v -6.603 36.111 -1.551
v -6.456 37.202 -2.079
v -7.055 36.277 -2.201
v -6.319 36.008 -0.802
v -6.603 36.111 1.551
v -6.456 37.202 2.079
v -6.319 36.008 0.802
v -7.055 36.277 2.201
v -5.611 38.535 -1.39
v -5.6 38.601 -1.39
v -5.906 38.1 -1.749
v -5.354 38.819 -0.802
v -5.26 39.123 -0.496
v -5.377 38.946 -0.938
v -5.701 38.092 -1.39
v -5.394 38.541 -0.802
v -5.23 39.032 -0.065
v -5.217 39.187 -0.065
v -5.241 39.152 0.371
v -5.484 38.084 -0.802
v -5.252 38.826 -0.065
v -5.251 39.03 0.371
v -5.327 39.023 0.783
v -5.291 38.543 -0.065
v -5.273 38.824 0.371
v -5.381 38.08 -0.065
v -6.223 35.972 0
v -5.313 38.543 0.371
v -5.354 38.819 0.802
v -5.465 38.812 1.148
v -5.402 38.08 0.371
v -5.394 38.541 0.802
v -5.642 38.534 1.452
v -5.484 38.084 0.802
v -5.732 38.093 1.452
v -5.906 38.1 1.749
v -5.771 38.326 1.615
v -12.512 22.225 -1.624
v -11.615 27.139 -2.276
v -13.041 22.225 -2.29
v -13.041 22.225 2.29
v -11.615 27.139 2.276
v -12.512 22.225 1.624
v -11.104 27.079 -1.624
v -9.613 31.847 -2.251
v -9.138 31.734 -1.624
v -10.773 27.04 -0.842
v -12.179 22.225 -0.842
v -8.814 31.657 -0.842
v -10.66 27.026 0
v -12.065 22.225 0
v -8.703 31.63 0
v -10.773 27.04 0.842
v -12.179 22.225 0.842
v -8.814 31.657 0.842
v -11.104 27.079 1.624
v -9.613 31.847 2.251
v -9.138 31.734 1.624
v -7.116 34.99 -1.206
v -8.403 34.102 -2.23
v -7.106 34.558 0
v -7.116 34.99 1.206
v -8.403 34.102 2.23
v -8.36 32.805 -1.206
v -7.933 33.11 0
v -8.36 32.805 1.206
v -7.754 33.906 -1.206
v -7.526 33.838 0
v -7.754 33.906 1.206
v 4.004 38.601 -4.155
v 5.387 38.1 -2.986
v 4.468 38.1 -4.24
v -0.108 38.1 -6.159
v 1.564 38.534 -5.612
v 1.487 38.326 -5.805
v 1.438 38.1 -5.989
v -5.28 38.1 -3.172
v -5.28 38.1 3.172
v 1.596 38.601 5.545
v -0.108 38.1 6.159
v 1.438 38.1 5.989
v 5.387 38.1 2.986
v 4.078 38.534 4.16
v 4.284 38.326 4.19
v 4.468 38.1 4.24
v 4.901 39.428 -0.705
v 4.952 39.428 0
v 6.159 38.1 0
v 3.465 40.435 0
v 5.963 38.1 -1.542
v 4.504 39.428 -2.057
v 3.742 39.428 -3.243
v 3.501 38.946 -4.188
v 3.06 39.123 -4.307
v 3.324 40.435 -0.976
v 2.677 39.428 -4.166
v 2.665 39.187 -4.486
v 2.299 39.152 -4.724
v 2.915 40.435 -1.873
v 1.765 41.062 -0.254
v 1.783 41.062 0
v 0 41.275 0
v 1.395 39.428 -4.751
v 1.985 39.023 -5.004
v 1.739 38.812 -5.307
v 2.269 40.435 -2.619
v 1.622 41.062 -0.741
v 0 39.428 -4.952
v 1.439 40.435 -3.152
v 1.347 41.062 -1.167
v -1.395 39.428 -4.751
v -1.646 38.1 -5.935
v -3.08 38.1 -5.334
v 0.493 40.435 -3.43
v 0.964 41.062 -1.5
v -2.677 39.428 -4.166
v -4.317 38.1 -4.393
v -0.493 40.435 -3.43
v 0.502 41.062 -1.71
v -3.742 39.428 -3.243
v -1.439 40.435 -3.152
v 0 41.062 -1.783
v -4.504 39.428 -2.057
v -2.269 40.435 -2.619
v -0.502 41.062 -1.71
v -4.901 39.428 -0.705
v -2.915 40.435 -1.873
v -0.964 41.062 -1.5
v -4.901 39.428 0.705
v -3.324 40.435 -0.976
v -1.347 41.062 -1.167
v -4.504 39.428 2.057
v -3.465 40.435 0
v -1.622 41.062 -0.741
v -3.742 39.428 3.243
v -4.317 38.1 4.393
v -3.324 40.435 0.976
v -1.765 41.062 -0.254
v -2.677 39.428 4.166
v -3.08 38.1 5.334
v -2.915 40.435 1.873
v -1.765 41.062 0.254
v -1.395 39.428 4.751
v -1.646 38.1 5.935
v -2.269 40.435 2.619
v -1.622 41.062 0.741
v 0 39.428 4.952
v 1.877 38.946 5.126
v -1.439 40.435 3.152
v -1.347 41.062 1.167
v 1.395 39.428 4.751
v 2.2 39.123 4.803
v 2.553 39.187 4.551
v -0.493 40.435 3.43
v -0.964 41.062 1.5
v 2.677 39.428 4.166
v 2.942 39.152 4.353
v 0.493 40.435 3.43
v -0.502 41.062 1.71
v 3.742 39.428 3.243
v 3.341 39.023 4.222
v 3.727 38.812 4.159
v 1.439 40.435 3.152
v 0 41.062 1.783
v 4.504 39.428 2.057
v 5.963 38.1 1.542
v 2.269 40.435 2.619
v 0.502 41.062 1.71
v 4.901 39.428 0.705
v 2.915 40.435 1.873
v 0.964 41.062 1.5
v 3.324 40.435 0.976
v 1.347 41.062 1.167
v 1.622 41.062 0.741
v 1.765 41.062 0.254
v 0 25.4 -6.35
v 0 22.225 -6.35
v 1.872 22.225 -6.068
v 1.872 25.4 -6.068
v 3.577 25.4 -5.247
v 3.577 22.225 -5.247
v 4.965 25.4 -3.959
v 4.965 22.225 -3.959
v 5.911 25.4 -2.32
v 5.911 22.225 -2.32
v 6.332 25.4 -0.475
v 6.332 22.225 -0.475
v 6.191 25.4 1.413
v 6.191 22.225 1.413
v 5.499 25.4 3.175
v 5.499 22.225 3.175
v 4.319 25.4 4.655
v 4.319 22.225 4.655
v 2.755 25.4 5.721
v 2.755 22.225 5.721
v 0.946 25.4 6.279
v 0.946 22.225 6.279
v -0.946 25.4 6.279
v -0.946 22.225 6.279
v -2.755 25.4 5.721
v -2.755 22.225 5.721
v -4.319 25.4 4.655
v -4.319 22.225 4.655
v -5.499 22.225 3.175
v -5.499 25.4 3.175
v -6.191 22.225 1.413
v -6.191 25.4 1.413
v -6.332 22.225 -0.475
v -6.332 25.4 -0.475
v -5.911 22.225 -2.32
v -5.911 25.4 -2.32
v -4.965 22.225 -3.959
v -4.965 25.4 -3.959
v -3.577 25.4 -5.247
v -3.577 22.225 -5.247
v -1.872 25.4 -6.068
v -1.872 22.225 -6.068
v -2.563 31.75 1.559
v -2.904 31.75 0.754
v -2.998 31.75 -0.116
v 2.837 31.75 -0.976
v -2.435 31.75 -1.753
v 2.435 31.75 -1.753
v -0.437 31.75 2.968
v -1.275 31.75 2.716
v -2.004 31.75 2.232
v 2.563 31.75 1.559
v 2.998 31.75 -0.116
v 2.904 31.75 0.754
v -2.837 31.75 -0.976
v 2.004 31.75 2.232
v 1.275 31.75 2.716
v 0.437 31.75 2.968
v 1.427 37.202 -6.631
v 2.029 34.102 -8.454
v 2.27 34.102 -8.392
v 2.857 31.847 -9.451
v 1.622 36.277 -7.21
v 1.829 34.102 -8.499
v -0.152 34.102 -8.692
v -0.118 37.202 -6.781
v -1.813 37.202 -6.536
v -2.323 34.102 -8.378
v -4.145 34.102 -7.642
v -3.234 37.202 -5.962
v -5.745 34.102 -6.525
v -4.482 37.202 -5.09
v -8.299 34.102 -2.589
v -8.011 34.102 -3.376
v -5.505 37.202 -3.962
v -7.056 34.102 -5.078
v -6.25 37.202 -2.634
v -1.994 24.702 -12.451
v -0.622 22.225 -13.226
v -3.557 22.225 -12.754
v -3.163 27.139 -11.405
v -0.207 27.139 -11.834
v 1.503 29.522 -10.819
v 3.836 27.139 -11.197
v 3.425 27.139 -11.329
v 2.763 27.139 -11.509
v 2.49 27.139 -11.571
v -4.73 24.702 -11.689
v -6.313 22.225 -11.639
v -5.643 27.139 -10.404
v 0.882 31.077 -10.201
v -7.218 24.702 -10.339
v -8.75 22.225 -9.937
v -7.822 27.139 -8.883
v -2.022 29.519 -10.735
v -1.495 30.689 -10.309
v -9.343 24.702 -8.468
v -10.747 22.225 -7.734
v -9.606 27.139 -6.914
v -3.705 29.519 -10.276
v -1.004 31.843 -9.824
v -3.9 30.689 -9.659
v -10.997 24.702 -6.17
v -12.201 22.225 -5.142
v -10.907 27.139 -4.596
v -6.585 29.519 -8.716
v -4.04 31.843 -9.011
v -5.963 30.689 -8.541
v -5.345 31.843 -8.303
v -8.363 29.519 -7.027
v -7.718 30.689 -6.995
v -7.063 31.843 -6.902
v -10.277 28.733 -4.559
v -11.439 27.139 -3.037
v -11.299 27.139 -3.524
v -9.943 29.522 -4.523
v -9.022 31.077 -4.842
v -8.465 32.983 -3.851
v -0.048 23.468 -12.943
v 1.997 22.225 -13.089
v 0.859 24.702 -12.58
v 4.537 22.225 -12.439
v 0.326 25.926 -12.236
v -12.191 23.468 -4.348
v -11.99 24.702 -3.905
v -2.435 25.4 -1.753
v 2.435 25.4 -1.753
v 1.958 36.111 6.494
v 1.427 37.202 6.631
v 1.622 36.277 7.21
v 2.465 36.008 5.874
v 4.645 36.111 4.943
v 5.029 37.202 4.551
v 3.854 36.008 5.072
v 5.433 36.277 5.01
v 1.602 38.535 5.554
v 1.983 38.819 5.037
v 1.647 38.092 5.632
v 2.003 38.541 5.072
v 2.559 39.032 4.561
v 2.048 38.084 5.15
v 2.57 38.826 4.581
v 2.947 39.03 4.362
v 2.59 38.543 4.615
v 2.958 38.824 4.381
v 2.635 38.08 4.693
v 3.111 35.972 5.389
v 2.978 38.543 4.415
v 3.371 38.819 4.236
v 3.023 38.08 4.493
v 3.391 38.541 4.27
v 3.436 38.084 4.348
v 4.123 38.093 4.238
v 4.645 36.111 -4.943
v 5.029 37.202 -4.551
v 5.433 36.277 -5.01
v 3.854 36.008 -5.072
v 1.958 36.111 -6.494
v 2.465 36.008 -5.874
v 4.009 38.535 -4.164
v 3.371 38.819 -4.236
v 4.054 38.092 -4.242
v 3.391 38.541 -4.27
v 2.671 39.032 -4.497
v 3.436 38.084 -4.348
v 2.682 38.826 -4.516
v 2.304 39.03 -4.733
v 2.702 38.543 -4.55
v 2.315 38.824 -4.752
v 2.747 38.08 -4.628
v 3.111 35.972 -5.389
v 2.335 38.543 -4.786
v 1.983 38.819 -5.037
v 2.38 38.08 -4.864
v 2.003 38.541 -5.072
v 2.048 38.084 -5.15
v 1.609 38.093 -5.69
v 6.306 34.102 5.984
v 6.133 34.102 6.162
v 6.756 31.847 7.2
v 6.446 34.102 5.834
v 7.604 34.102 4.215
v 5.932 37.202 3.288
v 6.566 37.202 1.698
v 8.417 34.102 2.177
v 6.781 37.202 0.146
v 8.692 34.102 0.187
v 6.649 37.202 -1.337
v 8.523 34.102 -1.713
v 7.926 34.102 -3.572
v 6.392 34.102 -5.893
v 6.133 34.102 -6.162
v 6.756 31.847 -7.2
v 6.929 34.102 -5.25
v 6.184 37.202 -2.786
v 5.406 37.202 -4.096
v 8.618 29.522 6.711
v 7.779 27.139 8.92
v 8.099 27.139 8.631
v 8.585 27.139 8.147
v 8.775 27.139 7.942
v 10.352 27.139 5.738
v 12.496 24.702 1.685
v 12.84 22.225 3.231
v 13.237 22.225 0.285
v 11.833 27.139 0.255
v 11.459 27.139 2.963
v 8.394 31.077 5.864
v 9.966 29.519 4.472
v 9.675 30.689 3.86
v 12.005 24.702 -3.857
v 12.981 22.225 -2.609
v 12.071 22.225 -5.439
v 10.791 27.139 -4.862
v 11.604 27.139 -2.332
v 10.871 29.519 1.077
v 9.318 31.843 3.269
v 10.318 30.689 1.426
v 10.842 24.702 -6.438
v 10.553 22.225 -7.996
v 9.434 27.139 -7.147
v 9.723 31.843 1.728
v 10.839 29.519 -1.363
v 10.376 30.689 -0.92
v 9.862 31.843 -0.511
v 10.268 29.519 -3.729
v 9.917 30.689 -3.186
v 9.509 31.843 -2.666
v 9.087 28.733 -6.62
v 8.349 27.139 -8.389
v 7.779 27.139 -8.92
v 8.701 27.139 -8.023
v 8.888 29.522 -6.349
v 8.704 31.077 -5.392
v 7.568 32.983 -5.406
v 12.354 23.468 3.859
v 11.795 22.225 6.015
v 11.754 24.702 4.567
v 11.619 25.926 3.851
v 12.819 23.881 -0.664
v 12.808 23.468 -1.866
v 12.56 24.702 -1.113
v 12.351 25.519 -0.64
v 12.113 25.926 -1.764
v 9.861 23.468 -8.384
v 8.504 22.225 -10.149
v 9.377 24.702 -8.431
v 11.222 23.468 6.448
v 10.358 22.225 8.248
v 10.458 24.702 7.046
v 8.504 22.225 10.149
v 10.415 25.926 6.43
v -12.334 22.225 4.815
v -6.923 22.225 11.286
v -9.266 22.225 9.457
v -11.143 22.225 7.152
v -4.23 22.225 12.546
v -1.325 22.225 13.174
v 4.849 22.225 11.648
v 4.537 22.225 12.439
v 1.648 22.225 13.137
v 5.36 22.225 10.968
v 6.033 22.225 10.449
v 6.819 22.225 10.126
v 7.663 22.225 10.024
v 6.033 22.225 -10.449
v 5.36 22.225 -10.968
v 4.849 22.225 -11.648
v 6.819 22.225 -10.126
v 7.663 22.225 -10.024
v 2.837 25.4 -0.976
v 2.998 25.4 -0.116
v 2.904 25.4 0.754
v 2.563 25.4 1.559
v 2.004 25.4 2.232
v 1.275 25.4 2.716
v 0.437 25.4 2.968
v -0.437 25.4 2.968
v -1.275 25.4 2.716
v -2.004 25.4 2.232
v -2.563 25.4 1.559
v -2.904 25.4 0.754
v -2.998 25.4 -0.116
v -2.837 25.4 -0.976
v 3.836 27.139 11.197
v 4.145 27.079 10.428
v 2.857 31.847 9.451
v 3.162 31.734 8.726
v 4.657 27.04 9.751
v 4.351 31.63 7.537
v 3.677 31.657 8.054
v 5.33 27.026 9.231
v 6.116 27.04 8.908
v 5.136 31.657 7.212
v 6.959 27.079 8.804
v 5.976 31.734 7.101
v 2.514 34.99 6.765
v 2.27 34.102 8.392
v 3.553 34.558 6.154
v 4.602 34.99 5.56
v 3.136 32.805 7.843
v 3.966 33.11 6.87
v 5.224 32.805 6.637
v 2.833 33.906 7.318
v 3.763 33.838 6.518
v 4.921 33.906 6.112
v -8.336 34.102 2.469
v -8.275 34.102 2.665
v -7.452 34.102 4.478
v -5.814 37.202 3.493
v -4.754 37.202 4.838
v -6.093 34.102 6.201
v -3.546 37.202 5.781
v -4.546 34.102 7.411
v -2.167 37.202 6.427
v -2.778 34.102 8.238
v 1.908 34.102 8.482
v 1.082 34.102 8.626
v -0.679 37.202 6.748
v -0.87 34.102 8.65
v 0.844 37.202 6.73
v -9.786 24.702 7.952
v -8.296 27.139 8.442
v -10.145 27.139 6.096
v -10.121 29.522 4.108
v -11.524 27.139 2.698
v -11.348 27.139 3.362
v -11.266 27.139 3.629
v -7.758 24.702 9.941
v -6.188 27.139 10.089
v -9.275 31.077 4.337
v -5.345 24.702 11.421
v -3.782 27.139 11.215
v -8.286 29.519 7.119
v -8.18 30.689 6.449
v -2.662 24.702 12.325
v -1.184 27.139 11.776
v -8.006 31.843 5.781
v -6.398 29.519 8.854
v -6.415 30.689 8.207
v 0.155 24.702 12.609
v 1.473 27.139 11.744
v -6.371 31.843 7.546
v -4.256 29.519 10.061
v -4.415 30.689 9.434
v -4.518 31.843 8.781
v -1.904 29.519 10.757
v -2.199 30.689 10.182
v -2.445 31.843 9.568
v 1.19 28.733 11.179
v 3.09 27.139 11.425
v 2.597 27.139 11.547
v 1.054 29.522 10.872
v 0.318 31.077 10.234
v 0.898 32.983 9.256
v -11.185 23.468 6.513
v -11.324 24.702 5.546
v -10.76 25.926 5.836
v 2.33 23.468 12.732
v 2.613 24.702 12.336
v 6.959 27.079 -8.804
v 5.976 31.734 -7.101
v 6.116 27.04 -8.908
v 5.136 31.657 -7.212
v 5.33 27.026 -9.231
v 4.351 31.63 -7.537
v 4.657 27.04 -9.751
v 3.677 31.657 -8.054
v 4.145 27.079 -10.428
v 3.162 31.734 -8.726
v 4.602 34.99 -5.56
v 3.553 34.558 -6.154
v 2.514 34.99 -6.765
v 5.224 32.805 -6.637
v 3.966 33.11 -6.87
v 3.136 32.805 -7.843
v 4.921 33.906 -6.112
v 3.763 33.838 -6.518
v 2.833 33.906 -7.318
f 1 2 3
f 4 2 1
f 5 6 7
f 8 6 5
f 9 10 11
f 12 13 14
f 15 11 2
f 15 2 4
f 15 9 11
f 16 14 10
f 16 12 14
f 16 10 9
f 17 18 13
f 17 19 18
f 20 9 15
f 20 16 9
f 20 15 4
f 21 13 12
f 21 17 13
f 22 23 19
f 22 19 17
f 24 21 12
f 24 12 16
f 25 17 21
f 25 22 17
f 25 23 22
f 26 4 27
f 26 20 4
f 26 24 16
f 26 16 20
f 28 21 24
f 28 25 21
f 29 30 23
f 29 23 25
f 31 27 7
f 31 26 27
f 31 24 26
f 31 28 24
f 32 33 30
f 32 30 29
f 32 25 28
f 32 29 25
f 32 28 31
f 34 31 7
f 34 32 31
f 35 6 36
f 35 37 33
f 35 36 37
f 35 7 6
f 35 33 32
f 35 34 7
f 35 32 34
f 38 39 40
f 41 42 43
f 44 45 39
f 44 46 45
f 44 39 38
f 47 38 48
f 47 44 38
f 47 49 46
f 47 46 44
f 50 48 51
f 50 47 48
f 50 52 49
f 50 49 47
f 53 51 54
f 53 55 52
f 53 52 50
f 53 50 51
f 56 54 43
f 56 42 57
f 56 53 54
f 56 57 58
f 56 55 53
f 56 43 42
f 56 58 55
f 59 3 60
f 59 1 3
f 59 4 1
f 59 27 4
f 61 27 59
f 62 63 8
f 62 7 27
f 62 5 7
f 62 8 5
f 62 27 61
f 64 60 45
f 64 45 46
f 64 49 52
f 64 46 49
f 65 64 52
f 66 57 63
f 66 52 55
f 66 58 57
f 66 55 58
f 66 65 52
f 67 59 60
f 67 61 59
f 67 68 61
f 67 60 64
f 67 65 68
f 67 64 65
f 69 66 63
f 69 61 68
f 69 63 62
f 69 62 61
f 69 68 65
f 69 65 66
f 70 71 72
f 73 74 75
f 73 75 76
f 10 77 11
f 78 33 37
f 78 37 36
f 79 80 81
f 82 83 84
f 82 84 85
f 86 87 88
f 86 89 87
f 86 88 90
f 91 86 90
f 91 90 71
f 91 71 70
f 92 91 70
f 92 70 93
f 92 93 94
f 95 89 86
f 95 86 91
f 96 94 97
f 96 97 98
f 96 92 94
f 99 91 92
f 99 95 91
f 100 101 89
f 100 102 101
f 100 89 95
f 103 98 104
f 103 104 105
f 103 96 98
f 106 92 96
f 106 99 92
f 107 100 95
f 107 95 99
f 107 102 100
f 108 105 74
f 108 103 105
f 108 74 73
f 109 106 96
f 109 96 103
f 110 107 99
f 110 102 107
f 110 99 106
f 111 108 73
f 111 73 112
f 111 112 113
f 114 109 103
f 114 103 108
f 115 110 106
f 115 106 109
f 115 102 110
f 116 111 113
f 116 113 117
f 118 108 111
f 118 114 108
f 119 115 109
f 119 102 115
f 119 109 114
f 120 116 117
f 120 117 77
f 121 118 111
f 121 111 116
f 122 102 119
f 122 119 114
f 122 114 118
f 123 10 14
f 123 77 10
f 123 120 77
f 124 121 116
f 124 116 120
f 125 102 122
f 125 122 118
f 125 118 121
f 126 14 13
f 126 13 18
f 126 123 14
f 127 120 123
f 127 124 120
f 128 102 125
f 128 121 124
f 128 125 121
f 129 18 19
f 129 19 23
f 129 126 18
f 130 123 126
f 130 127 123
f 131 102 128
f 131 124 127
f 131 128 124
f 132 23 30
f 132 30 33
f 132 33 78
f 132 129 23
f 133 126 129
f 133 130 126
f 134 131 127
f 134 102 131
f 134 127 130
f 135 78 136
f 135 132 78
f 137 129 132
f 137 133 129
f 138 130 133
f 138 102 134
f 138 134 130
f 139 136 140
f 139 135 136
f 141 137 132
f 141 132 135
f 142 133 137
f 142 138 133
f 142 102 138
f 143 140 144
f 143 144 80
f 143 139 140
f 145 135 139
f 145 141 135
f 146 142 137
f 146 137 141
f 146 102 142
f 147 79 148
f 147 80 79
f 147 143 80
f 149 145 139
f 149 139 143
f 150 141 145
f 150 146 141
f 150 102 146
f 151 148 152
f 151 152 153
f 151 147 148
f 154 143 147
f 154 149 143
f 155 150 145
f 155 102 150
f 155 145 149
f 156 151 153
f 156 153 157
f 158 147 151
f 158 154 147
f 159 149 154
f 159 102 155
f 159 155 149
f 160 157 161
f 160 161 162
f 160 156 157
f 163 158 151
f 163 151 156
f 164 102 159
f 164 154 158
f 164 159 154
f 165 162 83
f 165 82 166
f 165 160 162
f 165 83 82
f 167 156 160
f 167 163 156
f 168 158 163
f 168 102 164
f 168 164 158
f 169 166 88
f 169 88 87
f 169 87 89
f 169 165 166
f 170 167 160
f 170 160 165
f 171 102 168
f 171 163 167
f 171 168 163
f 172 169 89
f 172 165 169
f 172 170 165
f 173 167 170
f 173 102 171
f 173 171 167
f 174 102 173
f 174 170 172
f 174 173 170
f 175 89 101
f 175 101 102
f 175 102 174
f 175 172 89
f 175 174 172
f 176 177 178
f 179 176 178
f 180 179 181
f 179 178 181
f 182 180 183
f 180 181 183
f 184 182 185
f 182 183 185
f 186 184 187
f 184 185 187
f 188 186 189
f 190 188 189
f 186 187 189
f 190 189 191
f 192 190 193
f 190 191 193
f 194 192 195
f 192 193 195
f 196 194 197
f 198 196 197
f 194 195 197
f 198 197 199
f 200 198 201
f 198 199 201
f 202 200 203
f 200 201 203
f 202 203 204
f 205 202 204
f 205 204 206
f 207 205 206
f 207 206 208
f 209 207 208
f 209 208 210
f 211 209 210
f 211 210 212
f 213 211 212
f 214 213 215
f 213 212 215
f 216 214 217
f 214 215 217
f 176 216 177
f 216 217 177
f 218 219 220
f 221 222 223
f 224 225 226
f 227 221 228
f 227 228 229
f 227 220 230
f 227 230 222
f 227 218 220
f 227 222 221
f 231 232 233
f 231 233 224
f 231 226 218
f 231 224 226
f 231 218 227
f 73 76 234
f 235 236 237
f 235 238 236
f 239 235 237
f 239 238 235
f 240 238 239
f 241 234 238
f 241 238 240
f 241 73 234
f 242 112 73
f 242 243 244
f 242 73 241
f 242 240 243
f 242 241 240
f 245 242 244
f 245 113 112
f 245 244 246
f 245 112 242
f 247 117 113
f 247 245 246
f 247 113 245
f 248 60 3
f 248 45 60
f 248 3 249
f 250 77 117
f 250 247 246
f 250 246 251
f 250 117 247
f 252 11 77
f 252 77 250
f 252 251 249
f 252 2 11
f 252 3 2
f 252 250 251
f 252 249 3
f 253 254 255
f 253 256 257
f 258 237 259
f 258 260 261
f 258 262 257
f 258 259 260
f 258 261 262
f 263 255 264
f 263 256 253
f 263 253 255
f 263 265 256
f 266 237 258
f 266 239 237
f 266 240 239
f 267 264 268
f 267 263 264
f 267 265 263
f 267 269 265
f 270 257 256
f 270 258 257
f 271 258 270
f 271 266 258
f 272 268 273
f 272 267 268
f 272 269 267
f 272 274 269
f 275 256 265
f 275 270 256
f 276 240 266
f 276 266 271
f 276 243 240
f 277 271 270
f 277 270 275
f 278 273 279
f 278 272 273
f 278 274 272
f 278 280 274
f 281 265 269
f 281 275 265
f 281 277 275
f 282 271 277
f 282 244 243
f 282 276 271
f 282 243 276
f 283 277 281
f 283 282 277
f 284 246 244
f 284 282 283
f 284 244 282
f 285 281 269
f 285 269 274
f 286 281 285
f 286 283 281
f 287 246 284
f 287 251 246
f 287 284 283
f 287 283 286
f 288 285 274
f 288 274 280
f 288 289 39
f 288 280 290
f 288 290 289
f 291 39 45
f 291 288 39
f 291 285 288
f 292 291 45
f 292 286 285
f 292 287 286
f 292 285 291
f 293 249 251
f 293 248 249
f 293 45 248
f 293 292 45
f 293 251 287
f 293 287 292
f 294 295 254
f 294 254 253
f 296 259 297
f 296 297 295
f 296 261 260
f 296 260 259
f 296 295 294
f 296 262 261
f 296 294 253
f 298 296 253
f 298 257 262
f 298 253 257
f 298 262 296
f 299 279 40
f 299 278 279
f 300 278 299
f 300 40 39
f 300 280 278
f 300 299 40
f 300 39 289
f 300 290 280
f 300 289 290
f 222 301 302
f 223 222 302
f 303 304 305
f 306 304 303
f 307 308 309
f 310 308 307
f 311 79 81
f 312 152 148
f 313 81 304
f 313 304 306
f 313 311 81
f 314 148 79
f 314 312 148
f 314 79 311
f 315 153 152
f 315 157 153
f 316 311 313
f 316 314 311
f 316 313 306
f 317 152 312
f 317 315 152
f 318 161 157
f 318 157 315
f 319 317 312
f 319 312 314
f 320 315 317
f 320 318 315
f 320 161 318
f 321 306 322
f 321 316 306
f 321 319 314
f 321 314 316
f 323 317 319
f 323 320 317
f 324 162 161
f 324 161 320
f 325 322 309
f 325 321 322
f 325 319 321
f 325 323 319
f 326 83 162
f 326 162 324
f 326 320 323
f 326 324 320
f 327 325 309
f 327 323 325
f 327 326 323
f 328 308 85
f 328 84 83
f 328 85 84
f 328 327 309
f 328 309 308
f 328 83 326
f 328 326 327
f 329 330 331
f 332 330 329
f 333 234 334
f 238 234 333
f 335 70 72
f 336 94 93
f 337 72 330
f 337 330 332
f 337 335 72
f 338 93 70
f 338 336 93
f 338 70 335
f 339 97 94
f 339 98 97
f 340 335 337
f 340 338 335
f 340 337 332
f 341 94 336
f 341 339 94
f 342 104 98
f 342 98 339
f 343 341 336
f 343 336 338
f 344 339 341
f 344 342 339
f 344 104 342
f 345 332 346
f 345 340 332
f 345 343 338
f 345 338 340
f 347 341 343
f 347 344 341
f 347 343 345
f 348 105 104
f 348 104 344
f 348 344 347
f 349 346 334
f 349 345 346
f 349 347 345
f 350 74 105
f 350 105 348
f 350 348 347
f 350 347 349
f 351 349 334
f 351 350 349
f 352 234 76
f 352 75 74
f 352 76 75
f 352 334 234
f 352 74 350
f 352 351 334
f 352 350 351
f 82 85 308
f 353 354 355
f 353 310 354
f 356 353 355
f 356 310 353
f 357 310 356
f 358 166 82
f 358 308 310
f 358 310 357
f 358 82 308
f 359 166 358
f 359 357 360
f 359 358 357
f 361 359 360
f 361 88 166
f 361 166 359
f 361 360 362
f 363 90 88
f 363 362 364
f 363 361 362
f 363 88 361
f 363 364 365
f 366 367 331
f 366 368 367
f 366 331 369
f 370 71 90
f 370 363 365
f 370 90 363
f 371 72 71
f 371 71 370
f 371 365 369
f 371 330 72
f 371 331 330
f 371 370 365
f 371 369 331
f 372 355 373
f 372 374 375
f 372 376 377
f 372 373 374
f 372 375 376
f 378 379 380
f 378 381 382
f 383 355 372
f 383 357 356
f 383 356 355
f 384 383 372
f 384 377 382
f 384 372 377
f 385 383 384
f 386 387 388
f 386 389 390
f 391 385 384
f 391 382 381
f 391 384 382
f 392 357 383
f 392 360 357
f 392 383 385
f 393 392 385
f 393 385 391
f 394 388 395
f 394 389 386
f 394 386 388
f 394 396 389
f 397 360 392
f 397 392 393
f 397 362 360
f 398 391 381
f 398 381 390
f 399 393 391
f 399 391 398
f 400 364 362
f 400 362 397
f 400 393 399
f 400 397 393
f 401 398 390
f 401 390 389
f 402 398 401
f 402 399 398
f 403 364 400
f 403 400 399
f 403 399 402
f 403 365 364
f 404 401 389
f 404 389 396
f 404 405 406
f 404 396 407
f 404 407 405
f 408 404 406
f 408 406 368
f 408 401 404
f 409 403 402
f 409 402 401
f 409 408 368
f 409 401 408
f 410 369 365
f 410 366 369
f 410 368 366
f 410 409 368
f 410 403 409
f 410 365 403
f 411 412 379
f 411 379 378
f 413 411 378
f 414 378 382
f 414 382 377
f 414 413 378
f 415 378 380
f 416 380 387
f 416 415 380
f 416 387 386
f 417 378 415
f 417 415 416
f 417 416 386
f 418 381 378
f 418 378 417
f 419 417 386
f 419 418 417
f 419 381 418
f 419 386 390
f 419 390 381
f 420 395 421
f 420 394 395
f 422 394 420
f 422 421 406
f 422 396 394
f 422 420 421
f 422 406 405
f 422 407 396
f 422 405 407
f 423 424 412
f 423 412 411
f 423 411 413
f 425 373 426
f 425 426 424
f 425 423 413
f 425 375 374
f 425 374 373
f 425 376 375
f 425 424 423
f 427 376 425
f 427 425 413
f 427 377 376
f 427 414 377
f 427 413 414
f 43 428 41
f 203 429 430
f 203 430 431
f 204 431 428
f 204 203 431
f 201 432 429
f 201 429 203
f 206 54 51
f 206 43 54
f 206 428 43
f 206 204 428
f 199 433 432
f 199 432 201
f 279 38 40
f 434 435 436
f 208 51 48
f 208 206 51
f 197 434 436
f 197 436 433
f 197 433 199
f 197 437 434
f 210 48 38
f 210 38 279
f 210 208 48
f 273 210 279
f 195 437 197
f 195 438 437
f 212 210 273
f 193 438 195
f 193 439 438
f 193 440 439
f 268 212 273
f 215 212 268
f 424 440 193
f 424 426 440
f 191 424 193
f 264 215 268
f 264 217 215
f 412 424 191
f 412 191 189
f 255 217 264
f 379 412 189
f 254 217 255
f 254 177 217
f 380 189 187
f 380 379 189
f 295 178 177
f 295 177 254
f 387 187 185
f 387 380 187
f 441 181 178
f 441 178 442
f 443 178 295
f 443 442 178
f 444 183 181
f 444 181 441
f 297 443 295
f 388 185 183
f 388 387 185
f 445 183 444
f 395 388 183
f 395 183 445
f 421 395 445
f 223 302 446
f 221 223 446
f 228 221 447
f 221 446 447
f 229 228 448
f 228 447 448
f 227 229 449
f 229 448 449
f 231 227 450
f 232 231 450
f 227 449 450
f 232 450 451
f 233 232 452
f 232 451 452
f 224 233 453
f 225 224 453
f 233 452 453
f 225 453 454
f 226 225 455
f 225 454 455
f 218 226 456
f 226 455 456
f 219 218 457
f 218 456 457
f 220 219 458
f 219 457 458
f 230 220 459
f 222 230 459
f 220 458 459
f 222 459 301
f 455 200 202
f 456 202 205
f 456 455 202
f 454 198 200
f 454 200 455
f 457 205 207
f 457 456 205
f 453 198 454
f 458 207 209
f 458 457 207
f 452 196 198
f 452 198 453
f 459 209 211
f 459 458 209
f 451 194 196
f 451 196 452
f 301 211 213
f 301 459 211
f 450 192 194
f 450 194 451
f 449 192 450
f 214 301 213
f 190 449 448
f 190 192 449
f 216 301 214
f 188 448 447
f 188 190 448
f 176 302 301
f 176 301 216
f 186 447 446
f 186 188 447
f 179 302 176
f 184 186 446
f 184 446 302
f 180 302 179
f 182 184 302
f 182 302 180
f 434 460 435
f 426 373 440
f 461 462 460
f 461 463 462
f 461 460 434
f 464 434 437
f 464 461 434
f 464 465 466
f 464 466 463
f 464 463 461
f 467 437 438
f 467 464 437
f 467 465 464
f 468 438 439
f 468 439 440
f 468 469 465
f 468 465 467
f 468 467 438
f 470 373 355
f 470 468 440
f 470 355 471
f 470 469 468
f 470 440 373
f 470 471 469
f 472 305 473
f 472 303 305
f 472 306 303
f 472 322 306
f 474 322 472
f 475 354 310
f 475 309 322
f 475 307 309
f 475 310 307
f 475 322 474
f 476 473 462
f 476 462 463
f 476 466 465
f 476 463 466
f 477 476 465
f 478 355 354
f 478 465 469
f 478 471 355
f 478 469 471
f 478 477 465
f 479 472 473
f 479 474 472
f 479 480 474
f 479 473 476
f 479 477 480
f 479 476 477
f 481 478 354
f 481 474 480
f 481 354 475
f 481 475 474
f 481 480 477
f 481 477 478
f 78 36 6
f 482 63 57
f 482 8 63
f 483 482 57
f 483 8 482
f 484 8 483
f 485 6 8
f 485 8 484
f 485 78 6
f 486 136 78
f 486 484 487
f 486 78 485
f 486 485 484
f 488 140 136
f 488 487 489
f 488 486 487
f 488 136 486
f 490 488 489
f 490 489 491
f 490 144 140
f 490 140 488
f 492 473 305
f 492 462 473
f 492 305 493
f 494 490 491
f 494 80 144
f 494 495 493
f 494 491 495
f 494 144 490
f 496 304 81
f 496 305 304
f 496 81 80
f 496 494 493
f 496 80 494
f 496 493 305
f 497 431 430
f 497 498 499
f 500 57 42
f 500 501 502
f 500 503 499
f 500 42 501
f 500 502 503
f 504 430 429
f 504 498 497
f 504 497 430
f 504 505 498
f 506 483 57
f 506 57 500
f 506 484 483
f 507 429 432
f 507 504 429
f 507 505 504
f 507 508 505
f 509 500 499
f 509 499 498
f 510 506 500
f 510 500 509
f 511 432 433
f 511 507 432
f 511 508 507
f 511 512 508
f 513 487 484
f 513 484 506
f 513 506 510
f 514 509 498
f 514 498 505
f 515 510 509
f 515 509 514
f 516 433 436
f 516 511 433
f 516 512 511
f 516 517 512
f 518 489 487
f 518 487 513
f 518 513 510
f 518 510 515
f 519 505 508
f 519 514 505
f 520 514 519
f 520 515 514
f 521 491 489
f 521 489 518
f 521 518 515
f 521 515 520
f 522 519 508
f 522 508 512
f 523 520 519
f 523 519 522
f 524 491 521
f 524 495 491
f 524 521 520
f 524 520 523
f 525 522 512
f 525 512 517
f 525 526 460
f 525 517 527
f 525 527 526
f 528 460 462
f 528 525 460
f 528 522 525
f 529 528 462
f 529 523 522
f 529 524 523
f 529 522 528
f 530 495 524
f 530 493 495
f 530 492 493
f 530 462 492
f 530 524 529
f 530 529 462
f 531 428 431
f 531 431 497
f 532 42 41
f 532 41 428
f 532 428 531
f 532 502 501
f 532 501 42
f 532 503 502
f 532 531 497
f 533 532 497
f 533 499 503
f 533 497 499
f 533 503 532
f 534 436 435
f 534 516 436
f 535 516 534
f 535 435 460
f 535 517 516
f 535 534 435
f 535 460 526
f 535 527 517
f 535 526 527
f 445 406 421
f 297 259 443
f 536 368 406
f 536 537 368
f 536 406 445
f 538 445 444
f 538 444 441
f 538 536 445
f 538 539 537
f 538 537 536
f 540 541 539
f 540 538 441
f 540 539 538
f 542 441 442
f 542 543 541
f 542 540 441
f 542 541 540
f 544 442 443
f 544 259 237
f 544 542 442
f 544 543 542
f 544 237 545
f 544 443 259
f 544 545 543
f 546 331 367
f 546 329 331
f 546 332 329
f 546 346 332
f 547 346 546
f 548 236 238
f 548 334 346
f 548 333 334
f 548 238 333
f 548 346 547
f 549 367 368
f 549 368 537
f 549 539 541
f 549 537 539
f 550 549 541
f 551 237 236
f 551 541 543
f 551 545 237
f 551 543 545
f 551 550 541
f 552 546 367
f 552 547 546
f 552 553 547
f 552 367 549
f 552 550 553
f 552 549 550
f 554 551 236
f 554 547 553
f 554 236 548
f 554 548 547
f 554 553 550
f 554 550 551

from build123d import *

# Parameters (mm, degrees)
CUT_EXTRUDE1_REACH             = 47.963
SKETCH2_W                      = 34.925
SKETCH2_H                      = 22.225
CUT_EXTRUDE1_DIRECTION_2_REACH = 47.963
CUT_EXTRUDE2_DEPTH             = 9.525
CIRPATTERN1_COUNT              = 3
SKETCH6_R                      = 6.35
CUT_EXTRUDE3_DEPTH             = 3.175


with BuildPart() as part:
    # Sketch1 → Revolve1 (revolve)
    with BuildSketch(Plane.XY):
        with BuildLine():
            Line((0, 41.275), (0, 0))
            Line((0, 0), (7.5, 0))
            ThreePointArc((7.5, 0), (12.485619708, 5.484310547), (14.299969698, 12.670561319))
            ThreePointArc((14.299969698, 12.670561319), (14.3, 12.7), (14.299969698, 12.729438681))
            ThreePointArc((14.299969698, 12.729438681), (12.201631467, 26.047427638), (6.1595, 38.1))
            ThreePointArc((6.1595, 38.1), (3.464825582, 40.434546629), (0, 41.275))
        make_face()
    revolve(axis=Axis((0, 0, 0), (0, 1, 0)))

    # Sketch2 → Cut-Extrude1 (cut, up to next)
    with BuildSketch(Plane(origin=(0, 0, 0), x_dir=(0, 0, -1), z_dir=(1, 0, 0)), mode=Mode.PRIVATE) as cut_extrude1_sk1:
        with Locations((0, 11.1125)):
            Rectangle(SKETCH2_W, SKETCH2_H)
    cut_extrude1_tool1 = extrude(cut_extrude1_sk1.sketch, amount=-CUT_EXTRUDE1_REACH, mode=Mode.PRIVATE) & part.part
    add(cut_extrude1_tool1.solids().sort_by_distance((0, 11.1125, 0))[0], mode=Mode.SUBTRACT)

    # Sketch2 → Cut-Extrude1 direction 2 (cut, up to next)
    with BuildSketch(Plane(origin=(0, 0, 0), x_dir=(0, 0, -1), z_dir=(1, 0, 0)), mode=Mode.PRIVATE) as cut_extrude1_direction_2_sk1:
        with Locations((0, 11.1125)):
            Rectangle(SKETCH2_W, SKETCH2_H)
    cut_extrude1_direction_2_tool1 = extrude(cut_extrude1_direction_2_sk1.sketch, amount=CUT_EXTRUDE1_DIRECTION_2_REACH, mode=Mode.PRIVATE) & part.part
    add(cut_extrude1_direction_2_tool1.solids().sort_by_distance((0, 11.1125, 0))[0], mode=Mode.SUBTRACT)

    # Sketch3 → Cut-Extrude2 (cut)
    with BuildSketch(Plane.XZ.offset(-22.225)):
        with BuildLine():
            Line((-2.434829201, -1.7526), (2.434829201, -1.7526))
            ThreePointArc((2.434829201, -1.7526), (0, 3), (-2.434829201, -1.7526))
        make_face()
    extrude(amount=-CUT_EXTRUDE2_DEPTH, mode=Mode.SUBTRACT)

    # Cut-Sweep1: sweep along a path in Sketch4
    with BuildLine(Plane.XY) as cut_sweep1_path:
        Line((-6.35, 41.275), (-6.35, 39.7002))
        ThreePointArc((-6.35, 39.7002), (-6.599150778, 37.96819754), (-7.326398315, 36.376651231))
        ThreePointArc((-7.326398315, 36.376651231), (-10.906399133, 29.561182531), (-13.240375425, 22.225))
    # Sketch5 → Cut-Sweep1 (sweep, cut)
    with BuildSketch(Plane.XZ.offset(-22.225)):
        with BuildLine():
            ThreePointArc((-13.04083059, 2.290039063), (-12.065, 0), (-13.04083059, -2.290039063))
            ThreePointArc((-13.04083059, -2.290039063), (-13.240375425, 0), (-13.04083059, 2.290039063))
        make_face()
    cut_sweep1 = sweep(path=cut_sweep1_path.line, mode=Mode.SUBTRACT)

    # CirPattern1: Cut-Sweep1 ×3 about axis
    cirpattern1_axis = Axis((0, 42.243264125, 0), (0, -1, 0))
    for i in range(1, CIRPATTERN1_COUNT):
        add(cut_sweep1.rotate(cirpattern1_axis, i * 360 / CIRPATTERN1_COUNT), mode=Mode.SUBTRACT)

    # Sketch6 → Cut-Extrude3 (cut)
    with BuildSketch(Plane.XZ.offset(-22.225)):
        with Locations(Location((0, 0, 0), (0, 0, 270))):
            Circle(SKETCH6_R)
    extrude(amount=-CUT_EXTRUDE3_DEPTH, mode=Mode.SUBTRACT)


solid = part.part
